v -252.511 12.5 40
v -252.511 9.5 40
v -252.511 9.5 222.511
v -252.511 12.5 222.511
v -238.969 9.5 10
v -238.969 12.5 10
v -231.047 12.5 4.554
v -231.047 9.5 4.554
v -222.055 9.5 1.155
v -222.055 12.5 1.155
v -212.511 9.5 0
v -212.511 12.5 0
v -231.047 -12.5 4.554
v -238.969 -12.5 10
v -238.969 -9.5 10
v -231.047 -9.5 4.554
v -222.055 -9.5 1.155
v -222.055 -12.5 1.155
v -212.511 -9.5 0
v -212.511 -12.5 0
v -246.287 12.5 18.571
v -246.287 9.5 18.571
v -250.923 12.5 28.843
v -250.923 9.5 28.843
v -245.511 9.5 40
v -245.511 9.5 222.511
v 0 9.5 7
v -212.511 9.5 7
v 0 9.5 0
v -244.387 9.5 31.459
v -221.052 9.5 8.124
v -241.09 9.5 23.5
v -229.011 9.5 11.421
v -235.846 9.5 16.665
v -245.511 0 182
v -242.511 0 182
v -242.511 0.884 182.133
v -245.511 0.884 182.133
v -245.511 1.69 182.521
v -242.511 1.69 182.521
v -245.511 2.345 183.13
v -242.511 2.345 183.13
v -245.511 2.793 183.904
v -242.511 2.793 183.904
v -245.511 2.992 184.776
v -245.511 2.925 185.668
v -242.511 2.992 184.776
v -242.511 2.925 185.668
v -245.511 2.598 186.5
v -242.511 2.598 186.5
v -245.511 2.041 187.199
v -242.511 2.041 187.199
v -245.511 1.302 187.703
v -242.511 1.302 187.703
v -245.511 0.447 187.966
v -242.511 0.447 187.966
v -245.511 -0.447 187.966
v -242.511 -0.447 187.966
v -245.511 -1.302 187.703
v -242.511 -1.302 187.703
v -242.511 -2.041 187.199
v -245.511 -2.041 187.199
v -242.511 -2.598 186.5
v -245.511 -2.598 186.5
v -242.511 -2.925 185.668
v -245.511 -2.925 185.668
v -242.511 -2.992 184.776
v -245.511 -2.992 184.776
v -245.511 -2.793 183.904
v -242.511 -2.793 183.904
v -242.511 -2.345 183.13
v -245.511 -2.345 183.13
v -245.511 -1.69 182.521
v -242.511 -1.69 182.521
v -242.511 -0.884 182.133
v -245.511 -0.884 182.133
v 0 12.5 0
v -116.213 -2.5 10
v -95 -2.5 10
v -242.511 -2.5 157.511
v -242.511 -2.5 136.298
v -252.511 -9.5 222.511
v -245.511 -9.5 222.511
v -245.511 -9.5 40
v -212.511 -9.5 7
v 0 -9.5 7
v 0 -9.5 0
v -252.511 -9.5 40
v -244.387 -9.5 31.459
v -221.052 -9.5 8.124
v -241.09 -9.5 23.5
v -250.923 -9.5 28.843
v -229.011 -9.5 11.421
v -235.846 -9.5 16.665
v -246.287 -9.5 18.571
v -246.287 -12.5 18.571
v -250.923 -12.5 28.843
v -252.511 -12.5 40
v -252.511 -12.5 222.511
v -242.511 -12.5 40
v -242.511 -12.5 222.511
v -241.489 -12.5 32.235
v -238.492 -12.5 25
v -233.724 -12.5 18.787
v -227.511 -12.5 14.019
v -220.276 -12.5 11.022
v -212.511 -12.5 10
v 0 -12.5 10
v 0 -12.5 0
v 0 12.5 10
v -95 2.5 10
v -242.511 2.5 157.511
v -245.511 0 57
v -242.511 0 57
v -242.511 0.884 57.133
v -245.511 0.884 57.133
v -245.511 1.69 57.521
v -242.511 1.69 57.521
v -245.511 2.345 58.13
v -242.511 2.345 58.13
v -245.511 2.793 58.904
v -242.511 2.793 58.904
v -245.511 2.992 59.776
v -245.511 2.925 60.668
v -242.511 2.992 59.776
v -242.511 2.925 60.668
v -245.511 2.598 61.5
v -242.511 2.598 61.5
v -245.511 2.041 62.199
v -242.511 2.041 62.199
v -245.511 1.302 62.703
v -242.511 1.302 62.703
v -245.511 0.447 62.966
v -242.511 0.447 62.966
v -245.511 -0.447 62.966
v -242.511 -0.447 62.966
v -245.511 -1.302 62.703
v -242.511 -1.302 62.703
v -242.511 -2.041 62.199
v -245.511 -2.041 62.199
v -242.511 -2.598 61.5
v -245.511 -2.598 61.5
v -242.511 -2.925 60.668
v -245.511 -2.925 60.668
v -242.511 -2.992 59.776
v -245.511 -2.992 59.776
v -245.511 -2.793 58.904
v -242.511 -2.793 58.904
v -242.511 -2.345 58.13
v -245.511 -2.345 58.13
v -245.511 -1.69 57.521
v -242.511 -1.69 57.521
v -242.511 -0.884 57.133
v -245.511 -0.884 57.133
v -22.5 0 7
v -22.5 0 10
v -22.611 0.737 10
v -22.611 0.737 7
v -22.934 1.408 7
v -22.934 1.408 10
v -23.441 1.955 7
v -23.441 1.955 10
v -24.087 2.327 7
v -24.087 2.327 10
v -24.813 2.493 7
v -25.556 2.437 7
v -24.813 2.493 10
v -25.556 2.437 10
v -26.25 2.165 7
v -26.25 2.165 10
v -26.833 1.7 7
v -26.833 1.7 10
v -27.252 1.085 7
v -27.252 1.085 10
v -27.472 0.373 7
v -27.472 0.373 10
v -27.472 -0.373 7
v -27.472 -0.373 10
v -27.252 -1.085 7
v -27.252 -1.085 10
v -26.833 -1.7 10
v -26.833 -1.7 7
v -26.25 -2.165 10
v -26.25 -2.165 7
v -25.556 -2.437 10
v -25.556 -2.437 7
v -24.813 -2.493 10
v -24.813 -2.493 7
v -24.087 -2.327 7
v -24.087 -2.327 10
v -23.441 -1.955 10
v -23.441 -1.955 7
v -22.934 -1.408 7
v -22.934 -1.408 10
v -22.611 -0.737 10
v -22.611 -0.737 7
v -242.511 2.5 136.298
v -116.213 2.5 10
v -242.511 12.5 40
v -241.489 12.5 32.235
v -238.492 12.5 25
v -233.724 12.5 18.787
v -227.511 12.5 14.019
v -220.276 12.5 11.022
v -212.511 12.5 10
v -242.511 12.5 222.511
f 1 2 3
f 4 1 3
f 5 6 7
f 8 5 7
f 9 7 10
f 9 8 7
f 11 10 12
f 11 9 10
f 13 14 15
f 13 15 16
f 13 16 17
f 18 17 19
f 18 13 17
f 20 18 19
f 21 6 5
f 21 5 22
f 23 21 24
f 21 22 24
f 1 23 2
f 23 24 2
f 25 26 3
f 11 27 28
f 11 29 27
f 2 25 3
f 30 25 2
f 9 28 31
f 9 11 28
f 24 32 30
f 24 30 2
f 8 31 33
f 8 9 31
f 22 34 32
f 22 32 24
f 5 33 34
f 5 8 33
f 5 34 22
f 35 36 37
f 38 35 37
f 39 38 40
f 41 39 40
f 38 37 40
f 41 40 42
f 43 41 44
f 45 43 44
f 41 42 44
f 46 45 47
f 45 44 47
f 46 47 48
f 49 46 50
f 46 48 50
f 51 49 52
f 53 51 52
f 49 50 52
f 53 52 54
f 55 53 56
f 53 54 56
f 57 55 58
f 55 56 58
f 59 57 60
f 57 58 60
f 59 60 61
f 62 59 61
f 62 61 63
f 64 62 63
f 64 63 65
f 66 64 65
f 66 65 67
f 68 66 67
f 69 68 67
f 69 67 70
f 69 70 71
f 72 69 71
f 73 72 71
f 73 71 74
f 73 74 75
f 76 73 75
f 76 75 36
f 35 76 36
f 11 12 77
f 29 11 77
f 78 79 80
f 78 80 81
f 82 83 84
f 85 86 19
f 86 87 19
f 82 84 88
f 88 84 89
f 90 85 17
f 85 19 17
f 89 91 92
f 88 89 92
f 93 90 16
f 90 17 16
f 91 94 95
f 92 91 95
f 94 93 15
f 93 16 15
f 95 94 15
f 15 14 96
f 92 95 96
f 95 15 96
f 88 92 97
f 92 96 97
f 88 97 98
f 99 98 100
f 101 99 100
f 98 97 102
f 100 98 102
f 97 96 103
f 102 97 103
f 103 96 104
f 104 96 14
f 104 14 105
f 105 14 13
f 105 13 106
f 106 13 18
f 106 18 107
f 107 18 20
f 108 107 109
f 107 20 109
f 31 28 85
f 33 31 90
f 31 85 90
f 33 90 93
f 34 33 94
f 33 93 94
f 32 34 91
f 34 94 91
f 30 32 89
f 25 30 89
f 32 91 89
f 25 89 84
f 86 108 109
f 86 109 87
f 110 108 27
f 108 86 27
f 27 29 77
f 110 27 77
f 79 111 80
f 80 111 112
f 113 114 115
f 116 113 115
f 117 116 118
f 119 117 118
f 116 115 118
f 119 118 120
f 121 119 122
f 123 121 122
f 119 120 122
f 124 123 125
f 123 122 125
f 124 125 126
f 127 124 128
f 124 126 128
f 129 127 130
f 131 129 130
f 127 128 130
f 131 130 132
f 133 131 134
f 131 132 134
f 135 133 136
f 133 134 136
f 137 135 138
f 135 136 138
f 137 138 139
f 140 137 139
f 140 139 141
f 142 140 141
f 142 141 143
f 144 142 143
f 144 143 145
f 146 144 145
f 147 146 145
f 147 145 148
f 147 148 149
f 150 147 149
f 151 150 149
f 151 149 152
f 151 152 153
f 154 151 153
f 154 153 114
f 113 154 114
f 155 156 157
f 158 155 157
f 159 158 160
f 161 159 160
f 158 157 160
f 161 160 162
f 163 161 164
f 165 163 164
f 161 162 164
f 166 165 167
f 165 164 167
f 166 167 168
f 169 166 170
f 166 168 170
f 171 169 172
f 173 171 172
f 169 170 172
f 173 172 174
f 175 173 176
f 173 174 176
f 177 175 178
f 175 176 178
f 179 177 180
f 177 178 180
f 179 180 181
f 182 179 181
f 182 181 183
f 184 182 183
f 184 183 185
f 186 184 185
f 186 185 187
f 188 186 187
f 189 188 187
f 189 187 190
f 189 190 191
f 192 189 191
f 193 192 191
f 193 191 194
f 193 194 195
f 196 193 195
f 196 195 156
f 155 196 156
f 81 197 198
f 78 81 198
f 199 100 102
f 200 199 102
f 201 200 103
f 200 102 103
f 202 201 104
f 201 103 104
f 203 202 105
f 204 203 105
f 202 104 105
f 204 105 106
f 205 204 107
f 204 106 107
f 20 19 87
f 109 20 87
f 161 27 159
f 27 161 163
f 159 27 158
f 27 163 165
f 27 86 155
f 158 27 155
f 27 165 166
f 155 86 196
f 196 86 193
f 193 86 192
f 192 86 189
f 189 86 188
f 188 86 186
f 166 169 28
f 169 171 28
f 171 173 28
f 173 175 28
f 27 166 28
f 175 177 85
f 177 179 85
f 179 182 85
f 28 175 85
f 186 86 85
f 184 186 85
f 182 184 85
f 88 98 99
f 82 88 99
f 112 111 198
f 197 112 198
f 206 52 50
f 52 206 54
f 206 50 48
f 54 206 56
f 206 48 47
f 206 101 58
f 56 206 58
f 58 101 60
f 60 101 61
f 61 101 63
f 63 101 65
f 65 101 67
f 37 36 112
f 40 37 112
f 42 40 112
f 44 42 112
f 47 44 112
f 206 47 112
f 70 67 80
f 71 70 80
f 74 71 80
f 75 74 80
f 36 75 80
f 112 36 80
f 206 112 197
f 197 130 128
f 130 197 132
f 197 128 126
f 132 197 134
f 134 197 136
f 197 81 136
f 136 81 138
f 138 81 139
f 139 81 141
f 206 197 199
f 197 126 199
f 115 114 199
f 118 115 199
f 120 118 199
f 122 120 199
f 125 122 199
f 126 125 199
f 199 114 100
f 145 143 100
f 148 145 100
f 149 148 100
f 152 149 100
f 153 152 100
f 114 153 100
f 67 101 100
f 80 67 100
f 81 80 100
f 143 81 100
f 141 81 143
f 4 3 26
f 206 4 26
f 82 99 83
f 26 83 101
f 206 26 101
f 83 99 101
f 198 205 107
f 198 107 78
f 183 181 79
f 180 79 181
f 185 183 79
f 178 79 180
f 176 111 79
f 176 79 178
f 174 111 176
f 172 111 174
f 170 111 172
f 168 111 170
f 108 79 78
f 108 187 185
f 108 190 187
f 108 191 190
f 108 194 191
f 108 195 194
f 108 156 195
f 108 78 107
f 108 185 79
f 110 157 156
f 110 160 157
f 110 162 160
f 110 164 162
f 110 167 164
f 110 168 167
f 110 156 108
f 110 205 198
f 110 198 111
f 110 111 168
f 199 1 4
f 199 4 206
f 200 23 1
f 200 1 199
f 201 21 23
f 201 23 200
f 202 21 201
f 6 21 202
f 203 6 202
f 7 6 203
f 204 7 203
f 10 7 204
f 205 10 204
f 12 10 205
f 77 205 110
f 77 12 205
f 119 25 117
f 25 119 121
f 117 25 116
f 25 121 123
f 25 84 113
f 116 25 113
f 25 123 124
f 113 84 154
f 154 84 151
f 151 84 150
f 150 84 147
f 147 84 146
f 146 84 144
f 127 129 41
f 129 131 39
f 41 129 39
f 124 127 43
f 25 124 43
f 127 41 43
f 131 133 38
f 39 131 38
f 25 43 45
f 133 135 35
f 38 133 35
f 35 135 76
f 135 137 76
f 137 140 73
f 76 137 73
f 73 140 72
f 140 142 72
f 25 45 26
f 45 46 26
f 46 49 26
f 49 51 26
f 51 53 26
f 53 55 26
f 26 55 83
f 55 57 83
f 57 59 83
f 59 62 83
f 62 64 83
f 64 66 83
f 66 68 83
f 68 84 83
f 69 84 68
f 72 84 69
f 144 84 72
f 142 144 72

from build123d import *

# Parameters (mm, degrees)
ESQUISSE1_W                  = 450
ESQUISSE1_H                  = 25
EXTRUSION1_DEPTH             = 10
PLIAGE_START                 = -12.5
PLIAGE_1_DEPTH               = 25
PLIAGE_1_2_DEPTH             = 25
ESQUISSE5_R                  = 3
ENL_V_MAT_EXTRU_1_DEPTH      = 330.361564282
ESQUISSE7_R                  = 2.5
ENL_V_MAT_EXTRU_2_DEPTH      = 331.27116136
ENL_V_MAT_EXTRU_3_DEPTH      = 9.5
ENL_V_MAT_EXTRU_3_DEPTH_BACK = 9.5
EXTRUSION2_DEPTH             = 2.5


# Read off the part's stored shape, not the designer's step: Pliage 1
with BuildPart() as part:
    # Esquisse1 → Extrusion1 (new body)
    with BuildSketch(Plane.XY):
        with Locations((-225, 0)):
            Rectangle(ESQUISSE1_W, ESQUISSE1_H)
    extrude(amount=EXTRUSION1_DEPTH)

    # Pliage 1 outline → Pliage 1 (cut)
    with BuildSketch(Plane(origin=(0, 0, 0), x_dir=(1, 0, 0), z_dir=(0, 1, 0)).offset(PLIAGE_START)):
        with BuildLine():
            Line((-450, -10), (-238.968577392, -10))
            ThreePointArc((-238.968577392, -10), (-226.653199905, -2.583426132), (-212.511064281, 0))
            Line((-212.511064281, 0), (-450, 0))
            Line((-450, 0), (-450, -10))
        make_face()
    extrude(amount=PLIAGE_1_DEPTH, mode=Mode.SUBTRACT)

    # Pliage 1 2 outline → Pliage 1 2 (add)
    with BuildSketch(Plane(origin=(0, 0, 0), x_dir=(1, 0, 0), z_dir=(0, 1, 0)).offset(PLIAGE_START)):
        with BuildLine():
            ThreePointArc((-238.968577392, -10), (-248.968577392, -23.542486889), (-252.511064281, -40))
            Line((-252.511064281, -40), (-252.511064281, -222.511064281))
            Line((-252.511064281, -222.511064281), (-242.511064281, -222.511064281))
            Line((-242.511064281, -222.511064281), (-242.511064281, -40))
            ThreePointArc((-242.511064281, -40), (-233.724267717, -18.786796564), (-212.511064281, -10))
            Line((-212.511064281, -10), (-238.968577392, -10))
        make_face()
    extrude(amount=PLIAGE_1_2_DEPTH)

    # Esquisse5 → Enlèv. mat.-Extru.1 (cut, through all)
    with BuildSketch(Plane(origin=(-242.511064281, 0, 0), x_dir=(0, 0, -1), z_dir=(1, 0, 0))):
        with Locations((-185, 0)):
            Circle(ESQUISSE5_R)
        with Locations((-60, 0)):
            Circle(ESQUISSE5_R)
    extrude(amount=-ENL_V_MAT_EXTRU_1_DEPTH, mode=Mode.SUBTRACT)

    # Esquisse7 → Enlèv. mat.-Extru.2 (cut, through all)
    with BuildSketch(Plane.XY.offset(10)):
        with Locations((-25, 0)):
            Circle(ESQUISSE7_R)
    extrude(amount=-ENL_V_MAT_EXTRU_2_DEPTH, mode=Mode.SUBTRACT)

    # Esquisse8 → Enlèv. mat.-Extru.3 (cut, two sides: drawn at the far end of the back side and taken through both)
    with BuildSketch(Plane(origin=(0, 0, 0), x_dir=(1, 0, 0), z_dir=(0, 1, 0)).offset(-ENL_V_MAT_EXTRU_3_DEPTH_BACK)):
        with BuildLine():
            Line((0, -7), (-212.511064281, -7))
            ThreePointArc((-212.511064281, -7), (-235.84558806, -16.665476221), (-245.511064281, -40))
            Line((-245.511064281, -40), (-245.511064281, -222.511064281))
            Line((-245.511064281, -222.511064281), (-252.511064281, -222.511064281))
            Line((-252.511064281, -222.511064281), (-252.511064281, -40))
            ThreePointArc((-252.511064281, -40), (-240.795335529, -11.715728753), (-212.511064281, 0))
            Line((-212.511064281, 0), (0, 0))
            Line((0, 0), (0, -7))
        make_face()
    extrude(amount=ENL_V_MAT_EXTRU_3_DEPTH + ENL_V_MAT_EXTRU_3_DEPTH_BACK, mode=Mode.SUBTRACT)

    # Esquisse6 → Extrusion2 (add, symmetric)
    with BuildSketch(Plane(origin=(0, 0, 0), x_dir=(1, 0, 0), z_dir=(0, 1, 0))):
        Polygon((-242.511064281, -136.297860845), (-116.213203436, -10), (-95, -10), (-242.511064281, -157.511064281), align=None)
    extrude(amount=EXTRUSION2_DEPTH, both=True)


solid = part.part
